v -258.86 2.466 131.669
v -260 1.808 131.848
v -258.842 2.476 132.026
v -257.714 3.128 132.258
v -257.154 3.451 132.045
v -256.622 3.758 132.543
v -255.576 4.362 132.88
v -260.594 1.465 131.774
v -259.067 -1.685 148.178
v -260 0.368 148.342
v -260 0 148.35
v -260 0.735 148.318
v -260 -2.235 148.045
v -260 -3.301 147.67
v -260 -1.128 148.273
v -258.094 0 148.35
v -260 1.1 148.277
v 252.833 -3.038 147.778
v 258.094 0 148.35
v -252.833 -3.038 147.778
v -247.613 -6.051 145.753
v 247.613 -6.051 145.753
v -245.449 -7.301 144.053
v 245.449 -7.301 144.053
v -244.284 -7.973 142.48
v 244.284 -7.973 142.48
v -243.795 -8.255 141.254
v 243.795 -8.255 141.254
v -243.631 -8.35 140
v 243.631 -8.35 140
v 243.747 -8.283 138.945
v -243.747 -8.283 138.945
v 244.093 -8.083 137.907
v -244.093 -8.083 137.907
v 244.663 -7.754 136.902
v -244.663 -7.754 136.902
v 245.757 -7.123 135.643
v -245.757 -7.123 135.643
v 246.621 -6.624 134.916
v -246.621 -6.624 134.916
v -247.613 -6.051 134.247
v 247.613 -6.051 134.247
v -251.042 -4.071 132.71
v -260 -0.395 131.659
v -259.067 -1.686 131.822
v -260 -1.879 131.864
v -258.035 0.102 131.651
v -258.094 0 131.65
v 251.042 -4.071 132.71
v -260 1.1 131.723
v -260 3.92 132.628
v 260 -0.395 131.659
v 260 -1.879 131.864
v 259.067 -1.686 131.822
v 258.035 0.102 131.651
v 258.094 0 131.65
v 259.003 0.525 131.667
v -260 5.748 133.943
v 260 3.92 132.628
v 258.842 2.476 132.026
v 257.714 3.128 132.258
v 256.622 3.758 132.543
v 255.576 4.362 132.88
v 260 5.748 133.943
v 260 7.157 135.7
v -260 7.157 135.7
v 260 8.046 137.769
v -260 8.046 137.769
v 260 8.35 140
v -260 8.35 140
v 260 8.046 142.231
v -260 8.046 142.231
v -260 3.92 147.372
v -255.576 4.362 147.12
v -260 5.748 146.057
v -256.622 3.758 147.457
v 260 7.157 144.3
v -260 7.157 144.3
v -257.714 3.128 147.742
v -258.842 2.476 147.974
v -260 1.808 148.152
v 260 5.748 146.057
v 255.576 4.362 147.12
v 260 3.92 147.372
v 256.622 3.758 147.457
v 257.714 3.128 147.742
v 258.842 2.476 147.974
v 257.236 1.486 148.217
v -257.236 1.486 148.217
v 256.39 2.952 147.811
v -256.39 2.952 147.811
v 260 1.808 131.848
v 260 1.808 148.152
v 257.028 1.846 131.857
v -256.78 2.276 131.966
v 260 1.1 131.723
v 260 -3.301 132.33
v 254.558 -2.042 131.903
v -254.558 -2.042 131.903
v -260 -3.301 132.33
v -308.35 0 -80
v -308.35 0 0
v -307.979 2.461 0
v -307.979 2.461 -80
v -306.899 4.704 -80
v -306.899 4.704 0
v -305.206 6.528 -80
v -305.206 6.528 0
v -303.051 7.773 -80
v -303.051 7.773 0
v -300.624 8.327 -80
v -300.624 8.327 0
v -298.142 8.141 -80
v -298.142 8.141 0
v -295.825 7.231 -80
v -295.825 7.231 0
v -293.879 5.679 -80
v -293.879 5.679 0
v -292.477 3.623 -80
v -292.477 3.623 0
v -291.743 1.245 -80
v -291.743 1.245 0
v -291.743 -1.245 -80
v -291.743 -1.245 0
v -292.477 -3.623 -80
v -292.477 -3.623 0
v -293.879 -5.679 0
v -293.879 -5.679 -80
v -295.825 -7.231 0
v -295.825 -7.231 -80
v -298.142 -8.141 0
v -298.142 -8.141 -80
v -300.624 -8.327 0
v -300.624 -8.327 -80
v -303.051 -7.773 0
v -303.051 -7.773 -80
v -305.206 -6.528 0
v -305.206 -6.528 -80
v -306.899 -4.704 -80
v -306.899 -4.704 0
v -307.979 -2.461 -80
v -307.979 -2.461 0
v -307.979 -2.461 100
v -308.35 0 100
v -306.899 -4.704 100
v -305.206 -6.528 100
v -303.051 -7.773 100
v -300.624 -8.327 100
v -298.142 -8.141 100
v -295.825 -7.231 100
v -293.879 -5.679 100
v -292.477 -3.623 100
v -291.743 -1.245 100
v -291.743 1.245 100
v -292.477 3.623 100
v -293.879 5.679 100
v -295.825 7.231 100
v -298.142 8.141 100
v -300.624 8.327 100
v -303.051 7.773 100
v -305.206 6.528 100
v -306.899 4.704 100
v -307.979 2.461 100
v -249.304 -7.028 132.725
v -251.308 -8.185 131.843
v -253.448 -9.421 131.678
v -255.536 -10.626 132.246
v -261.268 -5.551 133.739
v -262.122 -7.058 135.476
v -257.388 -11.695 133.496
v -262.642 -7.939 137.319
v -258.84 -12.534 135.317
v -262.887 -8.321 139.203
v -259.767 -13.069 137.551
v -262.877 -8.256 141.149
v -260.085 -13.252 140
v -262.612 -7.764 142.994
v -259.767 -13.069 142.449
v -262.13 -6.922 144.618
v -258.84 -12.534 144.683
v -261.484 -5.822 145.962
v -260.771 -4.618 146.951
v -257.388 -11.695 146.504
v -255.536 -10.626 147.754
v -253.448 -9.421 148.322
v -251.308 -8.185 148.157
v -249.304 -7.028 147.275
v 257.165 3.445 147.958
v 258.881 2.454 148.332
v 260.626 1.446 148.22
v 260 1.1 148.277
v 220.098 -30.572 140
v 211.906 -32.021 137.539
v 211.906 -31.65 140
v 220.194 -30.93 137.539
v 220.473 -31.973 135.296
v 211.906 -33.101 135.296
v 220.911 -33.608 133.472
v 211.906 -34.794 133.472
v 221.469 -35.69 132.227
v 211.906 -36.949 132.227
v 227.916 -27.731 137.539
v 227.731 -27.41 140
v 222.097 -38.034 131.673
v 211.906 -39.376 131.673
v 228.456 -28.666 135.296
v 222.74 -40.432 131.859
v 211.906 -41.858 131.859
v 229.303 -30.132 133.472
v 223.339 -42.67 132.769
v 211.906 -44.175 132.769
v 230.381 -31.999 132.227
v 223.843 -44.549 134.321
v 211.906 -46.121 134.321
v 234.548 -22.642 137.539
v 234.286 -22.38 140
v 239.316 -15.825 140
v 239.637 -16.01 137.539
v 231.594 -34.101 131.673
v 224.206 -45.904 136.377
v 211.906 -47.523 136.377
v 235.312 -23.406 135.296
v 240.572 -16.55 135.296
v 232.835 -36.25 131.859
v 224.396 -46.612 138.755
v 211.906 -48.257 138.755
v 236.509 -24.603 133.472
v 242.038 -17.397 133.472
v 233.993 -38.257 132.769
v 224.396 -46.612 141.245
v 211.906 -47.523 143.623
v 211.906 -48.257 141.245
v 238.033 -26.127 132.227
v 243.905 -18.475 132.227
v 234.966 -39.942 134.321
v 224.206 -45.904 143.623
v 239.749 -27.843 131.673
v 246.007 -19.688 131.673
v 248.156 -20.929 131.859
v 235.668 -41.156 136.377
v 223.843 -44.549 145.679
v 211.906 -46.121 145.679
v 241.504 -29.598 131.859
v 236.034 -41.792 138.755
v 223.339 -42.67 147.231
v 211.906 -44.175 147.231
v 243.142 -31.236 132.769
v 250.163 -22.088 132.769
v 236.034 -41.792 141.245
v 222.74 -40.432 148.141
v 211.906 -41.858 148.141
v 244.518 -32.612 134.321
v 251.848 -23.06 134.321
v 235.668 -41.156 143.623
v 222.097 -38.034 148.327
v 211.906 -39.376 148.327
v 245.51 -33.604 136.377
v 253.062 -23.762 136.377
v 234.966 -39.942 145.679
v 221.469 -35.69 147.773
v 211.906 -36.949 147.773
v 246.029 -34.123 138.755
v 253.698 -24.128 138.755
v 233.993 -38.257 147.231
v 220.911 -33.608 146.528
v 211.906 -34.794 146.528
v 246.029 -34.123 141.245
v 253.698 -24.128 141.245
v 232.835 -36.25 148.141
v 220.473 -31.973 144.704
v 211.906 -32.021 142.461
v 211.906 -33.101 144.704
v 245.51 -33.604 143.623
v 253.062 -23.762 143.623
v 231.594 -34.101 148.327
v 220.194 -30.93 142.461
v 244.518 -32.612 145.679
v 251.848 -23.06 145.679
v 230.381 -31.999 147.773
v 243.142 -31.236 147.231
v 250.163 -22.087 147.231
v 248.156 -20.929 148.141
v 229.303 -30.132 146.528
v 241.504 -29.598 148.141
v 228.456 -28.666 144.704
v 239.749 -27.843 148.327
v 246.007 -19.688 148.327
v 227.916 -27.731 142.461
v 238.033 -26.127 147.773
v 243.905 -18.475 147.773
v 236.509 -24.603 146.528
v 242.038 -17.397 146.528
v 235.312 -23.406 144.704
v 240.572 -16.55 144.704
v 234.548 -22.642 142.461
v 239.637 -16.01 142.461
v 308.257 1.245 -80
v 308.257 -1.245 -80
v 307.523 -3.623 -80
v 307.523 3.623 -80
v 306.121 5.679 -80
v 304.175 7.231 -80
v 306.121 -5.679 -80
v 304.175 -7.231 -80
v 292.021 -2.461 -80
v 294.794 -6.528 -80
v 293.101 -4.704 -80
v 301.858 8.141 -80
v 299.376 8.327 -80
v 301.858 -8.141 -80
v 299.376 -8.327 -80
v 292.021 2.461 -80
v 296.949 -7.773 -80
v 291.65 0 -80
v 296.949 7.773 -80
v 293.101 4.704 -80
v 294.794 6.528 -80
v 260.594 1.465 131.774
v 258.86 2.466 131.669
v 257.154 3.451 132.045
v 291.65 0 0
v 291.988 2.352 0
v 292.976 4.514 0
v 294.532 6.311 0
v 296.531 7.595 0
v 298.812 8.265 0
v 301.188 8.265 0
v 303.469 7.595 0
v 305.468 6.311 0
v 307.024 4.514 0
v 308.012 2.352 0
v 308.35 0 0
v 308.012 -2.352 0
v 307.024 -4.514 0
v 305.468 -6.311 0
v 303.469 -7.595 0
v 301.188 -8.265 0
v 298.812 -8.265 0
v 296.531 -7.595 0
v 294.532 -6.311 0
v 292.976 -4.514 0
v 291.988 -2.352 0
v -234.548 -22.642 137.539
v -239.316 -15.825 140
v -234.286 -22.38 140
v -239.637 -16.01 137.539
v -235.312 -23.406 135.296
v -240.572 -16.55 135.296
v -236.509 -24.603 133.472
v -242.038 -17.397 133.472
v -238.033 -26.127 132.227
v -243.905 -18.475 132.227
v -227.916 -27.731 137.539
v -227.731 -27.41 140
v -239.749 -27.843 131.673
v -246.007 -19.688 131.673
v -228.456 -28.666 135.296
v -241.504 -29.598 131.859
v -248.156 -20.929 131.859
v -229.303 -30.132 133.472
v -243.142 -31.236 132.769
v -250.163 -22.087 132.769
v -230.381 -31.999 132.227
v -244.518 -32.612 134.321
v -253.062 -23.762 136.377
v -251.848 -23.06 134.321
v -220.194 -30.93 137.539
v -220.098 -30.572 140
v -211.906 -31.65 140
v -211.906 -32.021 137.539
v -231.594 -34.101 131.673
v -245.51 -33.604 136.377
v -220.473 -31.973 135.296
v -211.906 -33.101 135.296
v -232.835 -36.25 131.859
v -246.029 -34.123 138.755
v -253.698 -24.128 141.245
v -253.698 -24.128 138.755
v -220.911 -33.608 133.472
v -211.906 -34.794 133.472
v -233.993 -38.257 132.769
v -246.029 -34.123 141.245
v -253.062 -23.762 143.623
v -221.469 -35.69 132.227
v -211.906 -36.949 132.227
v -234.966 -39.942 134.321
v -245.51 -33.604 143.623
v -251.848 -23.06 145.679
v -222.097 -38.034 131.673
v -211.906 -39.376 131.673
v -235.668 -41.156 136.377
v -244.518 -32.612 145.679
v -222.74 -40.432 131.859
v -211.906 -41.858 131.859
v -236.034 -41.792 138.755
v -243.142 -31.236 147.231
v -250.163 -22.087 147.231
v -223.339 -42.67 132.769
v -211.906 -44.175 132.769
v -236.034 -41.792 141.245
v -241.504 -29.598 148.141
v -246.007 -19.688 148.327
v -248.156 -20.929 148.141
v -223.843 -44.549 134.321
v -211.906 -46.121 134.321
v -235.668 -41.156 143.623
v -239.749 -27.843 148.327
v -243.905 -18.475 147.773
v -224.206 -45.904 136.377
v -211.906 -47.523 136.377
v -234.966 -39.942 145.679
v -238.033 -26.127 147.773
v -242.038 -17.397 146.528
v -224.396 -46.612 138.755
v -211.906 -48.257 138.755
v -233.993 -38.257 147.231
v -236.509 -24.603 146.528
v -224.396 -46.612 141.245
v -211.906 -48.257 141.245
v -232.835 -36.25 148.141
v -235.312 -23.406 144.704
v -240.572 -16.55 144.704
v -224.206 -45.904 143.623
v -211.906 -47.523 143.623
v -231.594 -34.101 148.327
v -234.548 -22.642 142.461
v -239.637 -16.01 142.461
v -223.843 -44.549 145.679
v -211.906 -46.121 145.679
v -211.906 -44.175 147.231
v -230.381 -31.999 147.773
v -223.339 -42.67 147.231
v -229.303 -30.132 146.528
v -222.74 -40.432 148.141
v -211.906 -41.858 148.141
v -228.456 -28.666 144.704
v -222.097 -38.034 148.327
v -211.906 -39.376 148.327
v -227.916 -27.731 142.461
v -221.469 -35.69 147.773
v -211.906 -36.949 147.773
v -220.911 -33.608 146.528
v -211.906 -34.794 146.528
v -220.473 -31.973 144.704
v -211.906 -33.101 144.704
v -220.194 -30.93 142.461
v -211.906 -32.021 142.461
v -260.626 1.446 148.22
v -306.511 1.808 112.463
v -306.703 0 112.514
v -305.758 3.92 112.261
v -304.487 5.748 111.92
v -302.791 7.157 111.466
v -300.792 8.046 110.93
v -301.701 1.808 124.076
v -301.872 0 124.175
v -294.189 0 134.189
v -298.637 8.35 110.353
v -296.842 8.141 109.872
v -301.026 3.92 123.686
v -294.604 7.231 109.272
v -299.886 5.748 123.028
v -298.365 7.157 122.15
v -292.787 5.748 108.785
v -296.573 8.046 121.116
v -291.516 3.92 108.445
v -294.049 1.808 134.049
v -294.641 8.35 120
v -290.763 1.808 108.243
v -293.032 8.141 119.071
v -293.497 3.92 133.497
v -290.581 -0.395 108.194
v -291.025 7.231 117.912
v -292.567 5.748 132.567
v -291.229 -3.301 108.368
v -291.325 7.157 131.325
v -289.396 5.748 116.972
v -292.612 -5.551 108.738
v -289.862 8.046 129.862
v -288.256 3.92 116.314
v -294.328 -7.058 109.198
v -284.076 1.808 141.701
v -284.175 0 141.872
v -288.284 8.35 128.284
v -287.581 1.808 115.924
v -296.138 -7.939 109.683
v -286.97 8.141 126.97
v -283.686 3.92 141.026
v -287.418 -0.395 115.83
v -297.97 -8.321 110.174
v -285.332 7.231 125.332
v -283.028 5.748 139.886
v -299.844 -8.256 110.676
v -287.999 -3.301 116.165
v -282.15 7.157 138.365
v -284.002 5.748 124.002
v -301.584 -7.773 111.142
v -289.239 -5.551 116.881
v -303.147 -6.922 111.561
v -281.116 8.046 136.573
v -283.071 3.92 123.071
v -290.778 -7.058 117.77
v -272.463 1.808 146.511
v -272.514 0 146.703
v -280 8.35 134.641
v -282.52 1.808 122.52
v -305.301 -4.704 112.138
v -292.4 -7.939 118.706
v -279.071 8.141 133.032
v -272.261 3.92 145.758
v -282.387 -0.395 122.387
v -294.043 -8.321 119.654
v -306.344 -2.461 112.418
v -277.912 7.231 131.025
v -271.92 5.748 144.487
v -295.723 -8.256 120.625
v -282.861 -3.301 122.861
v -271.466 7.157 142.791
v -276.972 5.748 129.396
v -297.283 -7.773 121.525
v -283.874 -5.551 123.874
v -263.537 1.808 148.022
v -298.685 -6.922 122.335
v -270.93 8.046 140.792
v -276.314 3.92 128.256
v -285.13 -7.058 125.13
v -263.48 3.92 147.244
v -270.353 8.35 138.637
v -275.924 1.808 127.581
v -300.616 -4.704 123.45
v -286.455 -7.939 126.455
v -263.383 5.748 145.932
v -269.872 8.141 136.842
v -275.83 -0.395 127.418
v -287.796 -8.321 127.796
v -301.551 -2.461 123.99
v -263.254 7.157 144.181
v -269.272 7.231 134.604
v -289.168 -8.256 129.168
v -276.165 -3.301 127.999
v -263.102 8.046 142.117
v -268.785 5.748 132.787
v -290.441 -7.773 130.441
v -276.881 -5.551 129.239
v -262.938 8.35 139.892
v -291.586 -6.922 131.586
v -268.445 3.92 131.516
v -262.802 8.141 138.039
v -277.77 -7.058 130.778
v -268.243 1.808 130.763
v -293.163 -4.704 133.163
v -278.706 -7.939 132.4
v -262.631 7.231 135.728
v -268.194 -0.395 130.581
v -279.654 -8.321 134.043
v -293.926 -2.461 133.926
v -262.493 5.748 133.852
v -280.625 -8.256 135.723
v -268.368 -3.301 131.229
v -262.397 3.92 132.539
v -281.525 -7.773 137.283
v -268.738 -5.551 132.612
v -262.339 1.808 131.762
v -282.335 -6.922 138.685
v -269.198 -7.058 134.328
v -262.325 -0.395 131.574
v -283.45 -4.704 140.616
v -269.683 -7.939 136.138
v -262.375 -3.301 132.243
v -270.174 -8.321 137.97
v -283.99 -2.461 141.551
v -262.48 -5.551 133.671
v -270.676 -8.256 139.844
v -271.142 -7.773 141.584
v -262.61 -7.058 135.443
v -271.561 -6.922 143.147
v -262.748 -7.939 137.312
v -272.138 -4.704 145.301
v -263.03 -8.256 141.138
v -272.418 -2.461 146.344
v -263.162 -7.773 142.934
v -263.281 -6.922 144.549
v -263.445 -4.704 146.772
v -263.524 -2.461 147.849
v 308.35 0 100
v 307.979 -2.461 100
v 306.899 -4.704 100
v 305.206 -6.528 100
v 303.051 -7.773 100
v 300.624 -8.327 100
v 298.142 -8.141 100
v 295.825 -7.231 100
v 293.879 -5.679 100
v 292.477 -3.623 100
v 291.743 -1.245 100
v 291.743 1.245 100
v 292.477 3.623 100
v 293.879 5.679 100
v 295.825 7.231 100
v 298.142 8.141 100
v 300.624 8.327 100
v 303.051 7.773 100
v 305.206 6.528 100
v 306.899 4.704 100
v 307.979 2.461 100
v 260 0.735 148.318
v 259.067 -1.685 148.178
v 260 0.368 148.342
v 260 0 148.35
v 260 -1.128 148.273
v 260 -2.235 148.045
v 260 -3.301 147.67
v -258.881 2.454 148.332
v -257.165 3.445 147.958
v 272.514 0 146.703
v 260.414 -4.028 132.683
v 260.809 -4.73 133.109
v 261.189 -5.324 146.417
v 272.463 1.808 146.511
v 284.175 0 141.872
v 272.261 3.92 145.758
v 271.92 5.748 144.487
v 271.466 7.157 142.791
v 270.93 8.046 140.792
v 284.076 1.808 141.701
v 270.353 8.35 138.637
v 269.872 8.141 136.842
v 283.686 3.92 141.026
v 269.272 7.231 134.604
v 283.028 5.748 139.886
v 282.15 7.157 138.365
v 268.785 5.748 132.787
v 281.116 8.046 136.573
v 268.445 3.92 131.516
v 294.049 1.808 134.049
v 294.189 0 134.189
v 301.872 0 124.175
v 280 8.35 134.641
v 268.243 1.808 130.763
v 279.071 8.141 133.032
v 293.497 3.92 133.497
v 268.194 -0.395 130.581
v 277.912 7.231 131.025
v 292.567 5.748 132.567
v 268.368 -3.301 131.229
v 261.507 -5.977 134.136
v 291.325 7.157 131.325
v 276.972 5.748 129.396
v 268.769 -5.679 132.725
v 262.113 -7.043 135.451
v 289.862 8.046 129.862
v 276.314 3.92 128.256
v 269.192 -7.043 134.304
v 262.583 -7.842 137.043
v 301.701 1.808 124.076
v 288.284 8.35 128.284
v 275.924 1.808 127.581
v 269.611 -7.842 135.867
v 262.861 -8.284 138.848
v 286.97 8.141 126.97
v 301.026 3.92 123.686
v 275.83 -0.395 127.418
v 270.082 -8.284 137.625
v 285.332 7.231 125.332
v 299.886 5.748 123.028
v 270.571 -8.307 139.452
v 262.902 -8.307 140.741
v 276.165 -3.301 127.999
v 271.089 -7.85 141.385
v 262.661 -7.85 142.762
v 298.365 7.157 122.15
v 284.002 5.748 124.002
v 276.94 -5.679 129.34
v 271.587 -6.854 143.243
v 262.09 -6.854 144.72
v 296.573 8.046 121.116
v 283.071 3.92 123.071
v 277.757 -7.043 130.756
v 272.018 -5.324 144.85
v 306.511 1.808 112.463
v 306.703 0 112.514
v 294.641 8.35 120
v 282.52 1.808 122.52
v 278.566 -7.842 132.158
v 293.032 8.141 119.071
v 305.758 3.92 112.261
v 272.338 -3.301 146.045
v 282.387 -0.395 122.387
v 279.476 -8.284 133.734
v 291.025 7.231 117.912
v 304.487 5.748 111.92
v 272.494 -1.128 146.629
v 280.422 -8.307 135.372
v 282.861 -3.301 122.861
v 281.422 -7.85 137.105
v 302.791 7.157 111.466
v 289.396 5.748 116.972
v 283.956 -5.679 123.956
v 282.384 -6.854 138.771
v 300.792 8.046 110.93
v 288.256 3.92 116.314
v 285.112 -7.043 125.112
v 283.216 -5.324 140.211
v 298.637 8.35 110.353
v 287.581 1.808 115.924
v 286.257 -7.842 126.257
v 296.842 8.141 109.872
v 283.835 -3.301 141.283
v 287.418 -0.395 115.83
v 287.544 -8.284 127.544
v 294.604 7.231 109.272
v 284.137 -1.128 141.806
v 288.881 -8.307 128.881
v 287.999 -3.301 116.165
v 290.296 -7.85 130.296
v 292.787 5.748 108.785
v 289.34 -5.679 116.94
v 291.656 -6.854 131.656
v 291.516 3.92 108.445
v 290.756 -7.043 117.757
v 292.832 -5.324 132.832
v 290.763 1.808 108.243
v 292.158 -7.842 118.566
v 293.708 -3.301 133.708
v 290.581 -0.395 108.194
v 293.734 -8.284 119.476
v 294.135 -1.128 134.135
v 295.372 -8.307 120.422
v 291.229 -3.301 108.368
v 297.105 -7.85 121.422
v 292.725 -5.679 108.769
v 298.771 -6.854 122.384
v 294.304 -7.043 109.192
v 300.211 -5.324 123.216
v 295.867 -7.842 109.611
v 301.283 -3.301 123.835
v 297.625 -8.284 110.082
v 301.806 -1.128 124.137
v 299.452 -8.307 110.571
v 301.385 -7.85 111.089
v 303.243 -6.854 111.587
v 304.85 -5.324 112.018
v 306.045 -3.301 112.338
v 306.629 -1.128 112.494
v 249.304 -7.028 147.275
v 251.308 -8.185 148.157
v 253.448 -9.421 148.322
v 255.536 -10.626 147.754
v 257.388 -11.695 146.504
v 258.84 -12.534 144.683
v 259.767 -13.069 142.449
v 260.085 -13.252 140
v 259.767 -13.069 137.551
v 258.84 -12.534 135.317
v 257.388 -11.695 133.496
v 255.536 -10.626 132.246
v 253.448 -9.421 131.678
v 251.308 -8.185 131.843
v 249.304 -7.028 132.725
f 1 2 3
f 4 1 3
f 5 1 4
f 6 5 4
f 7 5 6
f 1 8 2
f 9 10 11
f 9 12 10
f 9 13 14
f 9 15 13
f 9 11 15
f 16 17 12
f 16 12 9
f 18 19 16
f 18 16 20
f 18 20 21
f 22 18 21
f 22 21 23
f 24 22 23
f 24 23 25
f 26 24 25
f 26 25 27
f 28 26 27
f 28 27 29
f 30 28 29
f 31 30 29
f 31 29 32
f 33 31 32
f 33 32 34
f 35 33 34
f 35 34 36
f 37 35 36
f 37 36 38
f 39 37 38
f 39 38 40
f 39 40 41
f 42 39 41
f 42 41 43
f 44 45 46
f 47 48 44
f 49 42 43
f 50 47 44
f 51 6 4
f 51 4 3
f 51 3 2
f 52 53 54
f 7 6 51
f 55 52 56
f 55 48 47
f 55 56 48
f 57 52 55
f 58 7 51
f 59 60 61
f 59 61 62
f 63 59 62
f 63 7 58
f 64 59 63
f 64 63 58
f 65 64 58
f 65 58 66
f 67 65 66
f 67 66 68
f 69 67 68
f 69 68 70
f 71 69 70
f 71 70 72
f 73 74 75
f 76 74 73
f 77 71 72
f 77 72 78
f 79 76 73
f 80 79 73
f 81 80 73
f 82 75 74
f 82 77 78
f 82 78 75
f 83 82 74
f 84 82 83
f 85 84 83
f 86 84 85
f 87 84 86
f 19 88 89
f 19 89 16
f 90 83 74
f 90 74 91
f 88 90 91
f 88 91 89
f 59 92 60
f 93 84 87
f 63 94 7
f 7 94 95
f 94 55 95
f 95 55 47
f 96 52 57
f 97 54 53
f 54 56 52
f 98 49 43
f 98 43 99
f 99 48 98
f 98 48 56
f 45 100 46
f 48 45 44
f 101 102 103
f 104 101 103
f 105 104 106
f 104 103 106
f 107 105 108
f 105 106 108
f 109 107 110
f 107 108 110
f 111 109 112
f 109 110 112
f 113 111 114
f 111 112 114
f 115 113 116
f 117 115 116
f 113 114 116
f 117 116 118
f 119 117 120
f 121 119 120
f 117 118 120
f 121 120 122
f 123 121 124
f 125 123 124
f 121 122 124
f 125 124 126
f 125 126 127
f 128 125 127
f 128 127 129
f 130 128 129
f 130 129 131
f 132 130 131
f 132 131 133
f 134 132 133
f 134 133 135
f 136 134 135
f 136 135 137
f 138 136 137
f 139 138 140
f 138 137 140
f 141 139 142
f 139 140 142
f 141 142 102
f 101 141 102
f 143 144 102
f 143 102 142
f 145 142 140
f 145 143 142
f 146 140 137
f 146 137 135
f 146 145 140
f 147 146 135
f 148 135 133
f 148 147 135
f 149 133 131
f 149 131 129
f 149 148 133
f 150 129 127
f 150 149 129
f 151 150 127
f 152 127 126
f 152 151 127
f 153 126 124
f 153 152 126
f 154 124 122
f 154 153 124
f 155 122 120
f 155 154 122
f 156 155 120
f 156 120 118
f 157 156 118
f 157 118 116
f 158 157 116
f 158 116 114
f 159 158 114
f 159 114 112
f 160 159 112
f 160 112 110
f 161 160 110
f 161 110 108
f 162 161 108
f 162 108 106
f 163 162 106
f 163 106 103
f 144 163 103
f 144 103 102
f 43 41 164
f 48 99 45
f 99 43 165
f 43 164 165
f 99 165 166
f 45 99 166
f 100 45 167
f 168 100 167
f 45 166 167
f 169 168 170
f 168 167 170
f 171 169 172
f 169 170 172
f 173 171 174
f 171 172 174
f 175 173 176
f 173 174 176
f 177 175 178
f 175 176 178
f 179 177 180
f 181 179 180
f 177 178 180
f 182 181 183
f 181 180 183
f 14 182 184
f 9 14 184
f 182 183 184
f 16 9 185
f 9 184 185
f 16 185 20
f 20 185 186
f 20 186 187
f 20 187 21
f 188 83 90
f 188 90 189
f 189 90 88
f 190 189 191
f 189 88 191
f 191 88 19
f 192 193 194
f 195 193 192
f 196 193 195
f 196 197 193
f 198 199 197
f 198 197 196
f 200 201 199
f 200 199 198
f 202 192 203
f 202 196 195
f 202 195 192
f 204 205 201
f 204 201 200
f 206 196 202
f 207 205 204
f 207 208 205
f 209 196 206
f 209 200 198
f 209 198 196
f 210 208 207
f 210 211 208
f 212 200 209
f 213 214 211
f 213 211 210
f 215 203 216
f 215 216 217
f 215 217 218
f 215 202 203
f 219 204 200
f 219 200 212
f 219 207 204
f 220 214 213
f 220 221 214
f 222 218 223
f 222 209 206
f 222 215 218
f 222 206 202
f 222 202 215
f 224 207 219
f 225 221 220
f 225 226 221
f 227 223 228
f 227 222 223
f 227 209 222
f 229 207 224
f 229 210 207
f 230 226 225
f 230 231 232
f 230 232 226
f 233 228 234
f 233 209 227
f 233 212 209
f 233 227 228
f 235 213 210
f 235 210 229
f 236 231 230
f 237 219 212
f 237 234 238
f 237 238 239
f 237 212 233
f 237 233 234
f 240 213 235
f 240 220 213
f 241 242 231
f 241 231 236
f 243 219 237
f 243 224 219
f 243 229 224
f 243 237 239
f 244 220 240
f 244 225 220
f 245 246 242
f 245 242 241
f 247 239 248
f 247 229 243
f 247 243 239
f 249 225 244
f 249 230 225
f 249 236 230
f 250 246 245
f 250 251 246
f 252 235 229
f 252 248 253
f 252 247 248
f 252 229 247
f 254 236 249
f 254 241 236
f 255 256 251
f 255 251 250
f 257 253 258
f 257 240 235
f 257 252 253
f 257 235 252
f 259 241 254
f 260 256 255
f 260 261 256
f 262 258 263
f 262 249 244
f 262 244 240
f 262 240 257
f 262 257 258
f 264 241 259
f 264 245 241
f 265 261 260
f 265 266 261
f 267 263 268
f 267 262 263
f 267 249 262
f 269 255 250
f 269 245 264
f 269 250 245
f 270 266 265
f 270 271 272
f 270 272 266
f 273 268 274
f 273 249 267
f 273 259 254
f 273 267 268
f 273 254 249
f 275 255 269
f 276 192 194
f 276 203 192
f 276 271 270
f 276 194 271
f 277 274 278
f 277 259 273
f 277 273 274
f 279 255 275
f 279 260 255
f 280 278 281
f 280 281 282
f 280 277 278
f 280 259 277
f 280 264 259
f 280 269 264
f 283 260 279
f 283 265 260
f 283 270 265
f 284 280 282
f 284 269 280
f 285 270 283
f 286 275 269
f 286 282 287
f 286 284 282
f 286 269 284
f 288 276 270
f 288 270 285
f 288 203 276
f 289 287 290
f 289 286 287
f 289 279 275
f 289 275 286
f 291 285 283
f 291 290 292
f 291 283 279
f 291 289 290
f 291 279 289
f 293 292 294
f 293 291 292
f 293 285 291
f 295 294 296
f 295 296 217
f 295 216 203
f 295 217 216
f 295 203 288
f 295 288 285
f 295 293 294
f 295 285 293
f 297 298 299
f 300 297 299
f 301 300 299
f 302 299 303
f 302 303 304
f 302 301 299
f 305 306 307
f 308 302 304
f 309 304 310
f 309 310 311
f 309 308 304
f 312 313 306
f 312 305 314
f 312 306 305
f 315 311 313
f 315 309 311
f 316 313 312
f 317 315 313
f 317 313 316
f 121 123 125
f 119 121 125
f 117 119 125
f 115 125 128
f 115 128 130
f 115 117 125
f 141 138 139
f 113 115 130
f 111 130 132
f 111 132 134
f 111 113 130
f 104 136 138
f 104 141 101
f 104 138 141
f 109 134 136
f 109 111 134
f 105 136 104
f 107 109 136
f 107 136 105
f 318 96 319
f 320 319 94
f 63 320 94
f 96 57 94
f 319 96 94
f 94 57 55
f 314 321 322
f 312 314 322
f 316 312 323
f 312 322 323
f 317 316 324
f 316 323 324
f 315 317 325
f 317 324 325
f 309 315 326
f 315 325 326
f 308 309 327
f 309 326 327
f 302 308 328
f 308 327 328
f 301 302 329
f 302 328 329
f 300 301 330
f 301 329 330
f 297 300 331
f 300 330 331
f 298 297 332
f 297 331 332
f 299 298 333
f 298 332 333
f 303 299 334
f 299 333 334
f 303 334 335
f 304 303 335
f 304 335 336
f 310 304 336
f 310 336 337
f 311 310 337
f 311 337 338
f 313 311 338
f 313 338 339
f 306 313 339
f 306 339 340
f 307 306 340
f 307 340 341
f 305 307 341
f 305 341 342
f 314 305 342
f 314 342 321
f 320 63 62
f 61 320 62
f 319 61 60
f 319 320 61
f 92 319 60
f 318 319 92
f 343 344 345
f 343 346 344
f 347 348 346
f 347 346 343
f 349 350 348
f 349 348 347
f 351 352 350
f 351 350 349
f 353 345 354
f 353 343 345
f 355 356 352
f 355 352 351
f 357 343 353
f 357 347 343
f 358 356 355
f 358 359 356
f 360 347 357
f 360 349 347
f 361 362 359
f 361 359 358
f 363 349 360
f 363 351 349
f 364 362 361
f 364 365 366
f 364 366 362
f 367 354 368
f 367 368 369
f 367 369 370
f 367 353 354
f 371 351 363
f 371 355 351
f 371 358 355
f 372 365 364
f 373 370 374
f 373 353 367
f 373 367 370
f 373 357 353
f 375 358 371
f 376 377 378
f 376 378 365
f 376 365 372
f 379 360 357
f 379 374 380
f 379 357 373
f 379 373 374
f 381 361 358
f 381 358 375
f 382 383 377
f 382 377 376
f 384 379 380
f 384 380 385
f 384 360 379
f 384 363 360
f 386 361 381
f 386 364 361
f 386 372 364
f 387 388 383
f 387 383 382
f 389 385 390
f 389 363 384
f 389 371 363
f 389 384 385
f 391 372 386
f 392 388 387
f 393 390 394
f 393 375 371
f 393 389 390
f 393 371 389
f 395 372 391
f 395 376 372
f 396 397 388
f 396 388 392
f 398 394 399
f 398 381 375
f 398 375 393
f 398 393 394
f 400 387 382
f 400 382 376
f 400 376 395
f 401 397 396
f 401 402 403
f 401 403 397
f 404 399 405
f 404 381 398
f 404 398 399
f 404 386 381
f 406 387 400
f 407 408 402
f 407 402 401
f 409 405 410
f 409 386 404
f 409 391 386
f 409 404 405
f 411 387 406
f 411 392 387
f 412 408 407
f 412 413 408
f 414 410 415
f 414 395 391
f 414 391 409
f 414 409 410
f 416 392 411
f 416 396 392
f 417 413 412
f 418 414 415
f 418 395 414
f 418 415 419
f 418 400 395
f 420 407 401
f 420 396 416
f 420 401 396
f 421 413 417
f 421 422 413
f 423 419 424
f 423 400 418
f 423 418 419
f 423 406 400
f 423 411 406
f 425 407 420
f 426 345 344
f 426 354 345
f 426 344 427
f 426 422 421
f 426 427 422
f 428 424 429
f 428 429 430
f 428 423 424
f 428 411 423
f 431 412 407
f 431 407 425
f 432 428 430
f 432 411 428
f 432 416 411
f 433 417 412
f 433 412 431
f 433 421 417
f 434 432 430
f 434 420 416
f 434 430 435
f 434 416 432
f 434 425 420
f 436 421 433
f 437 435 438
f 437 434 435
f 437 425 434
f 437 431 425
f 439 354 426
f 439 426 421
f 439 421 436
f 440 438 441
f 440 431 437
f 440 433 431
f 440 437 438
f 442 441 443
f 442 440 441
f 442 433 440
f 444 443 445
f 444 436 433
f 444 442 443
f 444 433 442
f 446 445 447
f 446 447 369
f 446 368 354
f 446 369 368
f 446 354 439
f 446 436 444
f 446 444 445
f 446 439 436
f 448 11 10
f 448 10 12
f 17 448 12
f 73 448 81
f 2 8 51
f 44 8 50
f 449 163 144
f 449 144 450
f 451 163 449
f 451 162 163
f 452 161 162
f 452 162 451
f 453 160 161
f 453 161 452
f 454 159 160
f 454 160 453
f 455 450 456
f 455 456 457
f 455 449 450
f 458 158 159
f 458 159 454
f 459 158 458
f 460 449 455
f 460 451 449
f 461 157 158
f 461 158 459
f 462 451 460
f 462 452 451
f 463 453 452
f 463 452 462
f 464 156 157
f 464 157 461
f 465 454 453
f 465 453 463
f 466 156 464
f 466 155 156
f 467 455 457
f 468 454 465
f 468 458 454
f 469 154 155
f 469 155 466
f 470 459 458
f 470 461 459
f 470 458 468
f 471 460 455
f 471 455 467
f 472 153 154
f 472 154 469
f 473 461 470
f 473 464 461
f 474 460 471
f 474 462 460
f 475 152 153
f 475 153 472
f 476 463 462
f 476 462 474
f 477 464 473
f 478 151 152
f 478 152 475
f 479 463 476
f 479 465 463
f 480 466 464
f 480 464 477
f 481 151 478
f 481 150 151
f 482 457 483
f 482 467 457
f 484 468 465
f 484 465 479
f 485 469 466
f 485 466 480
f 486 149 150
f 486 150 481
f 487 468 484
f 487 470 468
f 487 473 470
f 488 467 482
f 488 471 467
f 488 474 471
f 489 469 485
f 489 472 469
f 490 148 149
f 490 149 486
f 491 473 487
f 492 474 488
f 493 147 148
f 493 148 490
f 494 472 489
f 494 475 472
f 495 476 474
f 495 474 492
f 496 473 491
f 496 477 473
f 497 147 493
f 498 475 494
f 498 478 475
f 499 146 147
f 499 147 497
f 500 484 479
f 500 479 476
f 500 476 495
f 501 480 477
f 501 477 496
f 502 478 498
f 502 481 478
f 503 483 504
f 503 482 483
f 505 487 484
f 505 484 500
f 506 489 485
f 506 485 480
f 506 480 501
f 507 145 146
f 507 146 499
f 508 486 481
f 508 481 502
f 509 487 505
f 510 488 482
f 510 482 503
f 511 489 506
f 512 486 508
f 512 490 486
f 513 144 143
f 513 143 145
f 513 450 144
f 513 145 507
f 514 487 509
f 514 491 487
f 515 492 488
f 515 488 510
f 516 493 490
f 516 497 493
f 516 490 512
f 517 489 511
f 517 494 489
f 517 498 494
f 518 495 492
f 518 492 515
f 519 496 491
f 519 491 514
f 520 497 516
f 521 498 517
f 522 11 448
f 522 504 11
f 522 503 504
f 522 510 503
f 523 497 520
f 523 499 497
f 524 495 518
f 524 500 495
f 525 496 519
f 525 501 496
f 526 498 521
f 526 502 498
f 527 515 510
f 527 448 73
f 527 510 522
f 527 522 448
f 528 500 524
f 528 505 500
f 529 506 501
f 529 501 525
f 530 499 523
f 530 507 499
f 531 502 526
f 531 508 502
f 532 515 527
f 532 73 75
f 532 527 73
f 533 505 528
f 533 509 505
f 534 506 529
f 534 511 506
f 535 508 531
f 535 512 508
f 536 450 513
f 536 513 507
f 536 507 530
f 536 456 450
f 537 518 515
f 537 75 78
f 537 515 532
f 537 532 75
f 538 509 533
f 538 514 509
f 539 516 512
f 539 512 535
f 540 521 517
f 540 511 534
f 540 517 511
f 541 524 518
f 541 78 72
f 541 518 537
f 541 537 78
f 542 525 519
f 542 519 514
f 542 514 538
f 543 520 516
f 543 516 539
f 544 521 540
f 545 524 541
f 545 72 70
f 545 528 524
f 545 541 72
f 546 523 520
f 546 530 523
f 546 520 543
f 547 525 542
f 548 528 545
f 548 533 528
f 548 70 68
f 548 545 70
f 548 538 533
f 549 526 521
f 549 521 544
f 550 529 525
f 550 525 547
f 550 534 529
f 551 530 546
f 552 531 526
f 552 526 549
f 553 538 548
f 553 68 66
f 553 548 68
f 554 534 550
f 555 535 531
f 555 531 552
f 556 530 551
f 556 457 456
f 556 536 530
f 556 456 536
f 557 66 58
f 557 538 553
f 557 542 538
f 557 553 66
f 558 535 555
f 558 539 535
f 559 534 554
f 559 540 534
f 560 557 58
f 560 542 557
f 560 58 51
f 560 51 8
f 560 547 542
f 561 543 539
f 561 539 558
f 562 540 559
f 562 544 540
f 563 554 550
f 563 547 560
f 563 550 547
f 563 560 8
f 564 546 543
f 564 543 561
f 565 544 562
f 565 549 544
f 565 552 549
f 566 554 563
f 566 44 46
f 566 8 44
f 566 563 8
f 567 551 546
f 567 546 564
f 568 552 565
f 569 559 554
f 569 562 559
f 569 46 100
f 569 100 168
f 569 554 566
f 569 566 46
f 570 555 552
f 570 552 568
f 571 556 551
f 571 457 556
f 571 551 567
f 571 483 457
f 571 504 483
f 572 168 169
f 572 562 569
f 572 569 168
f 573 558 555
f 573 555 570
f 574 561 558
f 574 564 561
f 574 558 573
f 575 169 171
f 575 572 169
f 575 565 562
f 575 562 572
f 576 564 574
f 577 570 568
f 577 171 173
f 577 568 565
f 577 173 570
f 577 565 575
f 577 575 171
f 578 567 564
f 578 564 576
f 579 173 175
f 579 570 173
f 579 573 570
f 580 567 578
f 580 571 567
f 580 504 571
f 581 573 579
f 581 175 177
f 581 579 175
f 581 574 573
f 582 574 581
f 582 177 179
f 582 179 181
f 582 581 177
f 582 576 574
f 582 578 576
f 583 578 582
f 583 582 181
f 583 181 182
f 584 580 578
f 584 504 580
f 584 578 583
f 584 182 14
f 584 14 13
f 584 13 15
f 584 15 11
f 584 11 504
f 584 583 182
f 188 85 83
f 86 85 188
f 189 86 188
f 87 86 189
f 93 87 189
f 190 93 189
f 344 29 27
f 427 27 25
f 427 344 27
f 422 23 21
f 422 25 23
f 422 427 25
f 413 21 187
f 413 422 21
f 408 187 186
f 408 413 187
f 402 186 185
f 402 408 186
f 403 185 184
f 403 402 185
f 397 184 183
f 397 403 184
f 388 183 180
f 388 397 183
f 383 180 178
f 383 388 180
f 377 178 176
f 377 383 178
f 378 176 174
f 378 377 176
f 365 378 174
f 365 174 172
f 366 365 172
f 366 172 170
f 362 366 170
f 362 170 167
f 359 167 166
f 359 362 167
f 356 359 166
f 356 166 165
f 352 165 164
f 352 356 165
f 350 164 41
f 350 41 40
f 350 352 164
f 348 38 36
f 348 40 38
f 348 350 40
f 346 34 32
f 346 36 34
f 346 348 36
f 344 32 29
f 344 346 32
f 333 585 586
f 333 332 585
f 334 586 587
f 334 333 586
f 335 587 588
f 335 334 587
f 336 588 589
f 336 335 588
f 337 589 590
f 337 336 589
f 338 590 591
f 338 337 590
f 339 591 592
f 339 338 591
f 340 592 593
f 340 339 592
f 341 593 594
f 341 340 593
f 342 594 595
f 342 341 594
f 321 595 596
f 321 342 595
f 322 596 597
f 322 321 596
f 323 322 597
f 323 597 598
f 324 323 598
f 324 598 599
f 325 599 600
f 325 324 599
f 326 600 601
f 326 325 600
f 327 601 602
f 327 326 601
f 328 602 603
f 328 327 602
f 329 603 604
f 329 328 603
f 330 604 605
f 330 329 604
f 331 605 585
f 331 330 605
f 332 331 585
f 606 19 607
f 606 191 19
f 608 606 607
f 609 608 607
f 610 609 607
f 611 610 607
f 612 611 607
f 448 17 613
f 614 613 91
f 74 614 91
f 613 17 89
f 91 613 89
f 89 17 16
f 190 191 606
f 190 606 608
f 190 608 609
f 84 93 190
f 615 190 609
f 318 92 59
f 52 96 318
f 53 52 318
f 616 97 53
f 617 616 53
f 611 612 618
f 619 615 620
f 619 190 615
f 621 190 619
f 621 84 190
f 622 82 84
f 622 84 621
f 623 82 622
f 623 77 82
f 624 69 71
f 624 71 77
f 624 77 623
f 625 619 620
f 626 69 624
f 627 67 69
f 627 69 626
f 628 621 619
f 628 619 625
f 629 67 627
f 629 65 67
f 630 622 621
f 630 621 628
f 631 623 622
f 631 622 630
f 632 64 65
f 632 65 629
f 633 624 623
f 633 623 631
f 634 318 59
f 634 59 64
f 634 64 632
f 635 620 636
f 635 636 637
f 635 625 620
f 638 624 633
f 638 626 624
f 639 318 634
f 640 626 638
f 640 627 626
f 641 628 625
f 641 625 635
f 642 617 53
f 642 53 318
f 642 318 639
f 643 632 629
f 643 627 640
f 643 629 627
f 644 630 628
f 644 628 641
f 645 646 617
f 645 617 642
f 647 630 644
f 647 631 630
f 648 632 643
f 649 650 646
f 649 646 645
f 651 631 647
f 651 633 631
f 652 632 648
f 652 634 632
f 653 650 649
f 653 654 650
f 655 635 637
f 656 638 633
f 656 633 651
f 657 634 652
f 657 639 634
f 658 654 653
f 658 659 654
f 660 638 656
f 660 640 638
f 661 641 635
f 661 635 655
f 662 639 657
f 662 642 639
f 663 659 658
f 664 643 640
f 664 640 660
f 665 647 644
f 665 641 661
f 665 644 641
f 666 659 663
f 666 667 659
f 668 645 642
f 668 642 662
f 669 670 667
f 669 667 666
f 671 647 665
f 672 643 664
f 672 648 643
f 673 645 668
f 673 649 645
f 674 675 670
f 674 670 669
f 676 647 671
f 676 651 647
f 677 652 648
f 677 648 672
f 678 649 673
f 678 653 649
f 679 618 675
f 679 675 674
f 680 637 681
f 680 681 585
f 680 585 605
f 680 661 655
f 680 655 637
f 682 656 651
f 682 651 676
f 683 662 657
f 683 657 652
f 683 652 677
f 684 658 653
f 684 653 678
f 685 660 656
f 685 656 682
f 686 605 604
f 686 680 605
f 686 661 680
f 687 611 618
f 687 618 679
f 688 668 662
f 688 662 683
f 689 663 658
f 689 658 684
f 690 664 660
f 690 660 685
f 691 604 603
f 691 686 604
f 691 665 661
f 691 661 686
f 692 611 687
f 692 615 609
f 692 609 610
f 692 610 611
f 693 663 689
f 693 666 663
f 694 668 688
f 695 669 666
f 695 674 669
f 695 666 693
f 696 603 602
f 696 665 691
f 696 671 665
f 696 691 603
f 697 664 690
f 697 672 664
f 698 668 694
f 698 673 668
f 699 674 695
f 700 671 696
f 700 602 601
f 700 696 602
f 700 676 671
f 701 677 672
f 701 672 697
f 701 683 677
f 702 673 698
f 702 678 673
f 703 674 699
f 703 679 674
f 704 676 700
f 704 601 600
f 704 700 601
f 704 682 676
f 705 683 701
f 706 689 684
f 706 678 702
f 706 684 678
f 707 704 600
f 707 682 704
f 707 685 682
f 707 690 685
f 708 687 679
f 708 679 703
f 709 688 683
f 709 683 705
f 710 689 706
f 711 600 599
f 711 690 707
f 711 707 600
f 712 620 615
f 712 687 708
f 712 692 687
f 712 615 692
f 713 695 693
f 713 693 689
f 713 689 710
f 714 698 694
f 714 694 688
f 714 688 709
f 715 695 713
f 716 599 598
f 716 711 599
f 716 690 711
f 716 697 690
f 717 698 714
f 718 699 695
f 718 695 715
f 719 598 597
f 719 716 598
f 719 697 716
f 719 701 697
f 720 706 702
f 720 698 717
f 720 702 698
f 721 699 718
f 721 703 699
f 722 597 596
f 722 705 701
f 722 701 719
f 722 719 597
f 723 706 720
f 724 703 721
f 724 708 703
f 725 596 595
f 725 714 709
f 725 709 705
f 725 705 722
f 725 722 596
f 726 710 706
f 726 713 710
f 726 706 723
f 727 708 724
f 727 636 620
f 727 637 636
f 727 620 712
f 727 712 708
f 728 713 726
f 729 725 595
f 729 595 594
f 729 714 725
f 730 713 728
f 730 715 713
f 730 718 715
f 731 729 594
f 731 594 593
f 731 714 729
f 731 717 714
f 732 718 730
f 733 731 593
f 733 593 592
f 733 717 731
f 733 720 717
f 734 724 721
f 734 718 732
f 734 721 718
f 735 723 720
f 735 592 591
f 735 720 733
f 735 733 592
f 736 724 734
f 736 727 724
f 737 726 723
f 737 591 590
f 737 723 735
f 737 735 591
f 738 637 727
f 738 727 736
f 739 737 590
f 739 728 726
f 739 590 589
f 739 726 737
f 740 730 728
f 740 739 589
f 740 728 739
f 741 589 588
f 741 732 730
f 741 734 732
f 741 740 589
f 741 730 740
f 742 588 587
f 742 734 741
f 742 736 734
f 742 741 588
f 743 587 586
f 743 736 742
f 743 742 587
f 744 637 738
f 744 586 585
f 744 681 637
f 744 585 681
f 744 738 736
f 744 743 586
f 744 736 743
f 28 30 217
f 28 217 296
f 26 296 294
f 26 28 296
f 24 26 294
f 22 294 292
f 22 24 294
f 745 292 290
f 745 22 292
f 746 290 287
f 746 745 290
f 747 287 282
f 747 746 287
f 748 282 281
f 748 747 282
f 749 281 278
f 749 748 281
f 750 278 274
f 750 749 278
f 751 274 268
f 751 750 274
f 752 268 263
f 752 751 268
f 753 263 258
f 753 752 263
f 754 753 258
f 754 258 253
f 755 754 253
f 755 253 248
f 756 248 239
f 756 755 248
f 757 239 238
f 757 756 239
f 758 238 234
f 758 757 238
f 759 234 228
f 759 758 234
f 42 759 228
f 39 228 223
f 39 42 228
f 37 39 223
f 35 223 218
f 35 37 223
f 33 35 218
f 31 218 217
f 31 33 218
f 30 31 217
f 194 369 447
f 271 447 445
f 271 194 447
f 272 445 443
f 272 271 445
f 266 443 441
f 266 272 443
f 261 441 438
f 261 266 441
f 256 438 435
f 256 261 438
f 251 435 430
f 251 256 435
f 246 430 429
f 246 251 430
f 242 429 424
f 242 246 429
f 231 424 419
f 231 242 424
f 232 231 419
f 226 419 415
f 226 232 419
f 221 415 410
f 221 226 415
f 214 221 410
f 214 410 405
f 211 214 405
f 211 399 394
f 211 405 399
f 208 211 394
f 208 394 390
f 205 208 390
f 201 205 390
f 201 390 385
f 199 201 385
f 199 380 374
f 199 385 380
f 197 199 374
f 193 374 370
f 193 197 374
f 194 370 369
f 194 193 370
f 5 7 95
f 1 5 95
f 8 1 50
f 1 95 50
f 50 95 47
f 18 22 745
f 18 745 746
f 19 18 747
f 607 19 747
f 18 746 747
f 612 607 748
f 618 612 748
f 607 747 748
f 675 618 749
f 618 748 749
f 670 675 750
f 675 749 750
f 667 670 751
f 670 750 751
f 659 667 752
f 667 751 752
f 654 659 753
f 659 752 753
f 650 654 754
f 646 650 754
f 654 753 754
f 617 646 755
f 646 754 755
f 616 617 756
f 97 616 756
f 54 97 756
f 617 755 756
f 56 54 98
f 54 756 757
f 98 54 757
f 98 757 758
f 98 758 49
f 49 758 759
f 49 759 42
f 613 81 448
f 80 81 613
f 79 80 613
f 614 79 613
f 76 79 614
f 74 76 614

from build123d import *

# Parameters (mm, degrees)
SKETCH2_R           = 8.35
SKETCH4_R           = 8.35
BOSS_EXTRUDE2_DEPTH = 13
BOSS_EXTRUDE3_DEPTH = 13
SKETCH7_R           = 8.35
BOSS_EXTRUDE4_DEPTH = 80
SKETCH8_R           = 8.35
BOSS_EXTRUDE5_DEPTH = 80


with BuildPart() as part:
    # Sweep1: sweep along a path in Sketch1
    with BuildLine(Plane(origin=(0, 0, 0), x_dir=(1, 0, 0), z_dir=(0, 1, 0))) as sweep1_path:
        Line((-300, 0), (-300, -100))
        ThreePointArc((-300, -100), (-288.284271247, -128.284271247), (-260, -140))
        Line((-260, -140), (260, -140))
        ThreePointArc((260, -140), (288.284271247, -128.284271247), (300, -100))
        Line((300, -100), (300, 0))
    # Sketch2 → Sweep1 (sweep)
    with BuildSketch(Plane.XY):
        with Locations((300, 0)):
            Circle(SKETCH2_R)
    sweep(path=sweep1_path.line)

    # Sweep2: sweep along a path in Sketch3
    with BuildLine(Plane.XY.offset(140)) as sweep2_path:
        Line((-252.853261493, -9.077244013), (-246.547005384, -20))
        ThreePointArc((-246.547005384, -20), (-231.905989232, -34.641016151), (-211.905989232, -40))
        Line((-211.905989232, -40), (211.905989232, -40))
        ThreePointArc((211.905989232, -40), (231.905989232, -34.641016151), (246.547005384, -20))
        Line((246.547005384, -20), (252.853261493, -9.077244013))
    # Sketch4 → Sweep2 (sweep)
    with BuildSketch(Plane(origin=(-252.853261493, -9.077244013, 140), x_dir=(0.866025404, 0.5, 0), z_dir=(-0.5, 0.866025404, 0))):
        Circle(SKETCH4_R)
    sweep(path=sweep2_path.line)

    # Sketch5 → Boss-Extrude2 (add)
    with BuildSketch(Plane(origin=(-59.282753417, 102.680740932, 0), x_dir=(0.866025404, 0.5, 0), z_dir=(-0.5, 0.866025404, 0))):
        with BuildLine():
            ThreePointArc((-217.464473881, -134.246575276), (-231.865969889, -140), (-217.464473881, -145.753424724))
            add(Edge.make_bspline(
                [(-217.464473881, -134.246575276), (-228.404544239, -140), (-217.464473881, -145.753424724)],
                knots=[2.381438875, 2.381438875, 2.381438875, 3.901746432, 3.901746432, 3.901746432], degree=2, weights=[1, 0.724730061, 1]))
        make_face()
    extrude(amount=BOSS_EXTRUDE2_DEPTH)

    # Sketch6 → Boss-Extrude3 (add)
    with BuildSketch(Plane(origin=(59.282753417, 102.680740932, 0), x_dir=(0.866025404, -0.5, 0), z_dir=(0.5, 0.866025404, 0))):
        with BuildLine():
            ThreePointArc((217.464473881, -145.753424724), (231.865969889, -140), (217.464473881, -134.246575276))
            add(Edge.make_bspline(
                [(217.464473881, -145.753424724), (228.404544239, -140), (217.464473881, -134.246575276)],
                knots=[5.523031529, 5.523031529, 5.523031529, 7.043339086, 7.043339086, 7.043339086], degree=2, weights=[1, 0.724730061, 1]))
        make_face()
    extrude(amount=BOSS_EXTRUDE3_DEPTH)

    # Sketch7 → Boss-Extrude4 (add)
    with BuildSketch(Plane(origin=(0, 0, 0), x_dir=(-1, 0, 0), z_dir=(0, 0, -1))):
        with Locations((-300, 0)):
            Circle(SKETCH7_R)
    extrude(amount=BOSS_EXTRUDE4_DEPTH)

    # Sketch8 → Boss-Extrude5 (add)
    with BuildSketch(Plane(origin=(0, 0, 0), x_dir=(-1, 0, 0), z_dir=(0, 0, -1))):
        with Locations((300, 0)):
            Circle(SKETCH8_R)
    extrude(amount=BOSS_EXTRUDE5_DEPTH)


solid = part.part
